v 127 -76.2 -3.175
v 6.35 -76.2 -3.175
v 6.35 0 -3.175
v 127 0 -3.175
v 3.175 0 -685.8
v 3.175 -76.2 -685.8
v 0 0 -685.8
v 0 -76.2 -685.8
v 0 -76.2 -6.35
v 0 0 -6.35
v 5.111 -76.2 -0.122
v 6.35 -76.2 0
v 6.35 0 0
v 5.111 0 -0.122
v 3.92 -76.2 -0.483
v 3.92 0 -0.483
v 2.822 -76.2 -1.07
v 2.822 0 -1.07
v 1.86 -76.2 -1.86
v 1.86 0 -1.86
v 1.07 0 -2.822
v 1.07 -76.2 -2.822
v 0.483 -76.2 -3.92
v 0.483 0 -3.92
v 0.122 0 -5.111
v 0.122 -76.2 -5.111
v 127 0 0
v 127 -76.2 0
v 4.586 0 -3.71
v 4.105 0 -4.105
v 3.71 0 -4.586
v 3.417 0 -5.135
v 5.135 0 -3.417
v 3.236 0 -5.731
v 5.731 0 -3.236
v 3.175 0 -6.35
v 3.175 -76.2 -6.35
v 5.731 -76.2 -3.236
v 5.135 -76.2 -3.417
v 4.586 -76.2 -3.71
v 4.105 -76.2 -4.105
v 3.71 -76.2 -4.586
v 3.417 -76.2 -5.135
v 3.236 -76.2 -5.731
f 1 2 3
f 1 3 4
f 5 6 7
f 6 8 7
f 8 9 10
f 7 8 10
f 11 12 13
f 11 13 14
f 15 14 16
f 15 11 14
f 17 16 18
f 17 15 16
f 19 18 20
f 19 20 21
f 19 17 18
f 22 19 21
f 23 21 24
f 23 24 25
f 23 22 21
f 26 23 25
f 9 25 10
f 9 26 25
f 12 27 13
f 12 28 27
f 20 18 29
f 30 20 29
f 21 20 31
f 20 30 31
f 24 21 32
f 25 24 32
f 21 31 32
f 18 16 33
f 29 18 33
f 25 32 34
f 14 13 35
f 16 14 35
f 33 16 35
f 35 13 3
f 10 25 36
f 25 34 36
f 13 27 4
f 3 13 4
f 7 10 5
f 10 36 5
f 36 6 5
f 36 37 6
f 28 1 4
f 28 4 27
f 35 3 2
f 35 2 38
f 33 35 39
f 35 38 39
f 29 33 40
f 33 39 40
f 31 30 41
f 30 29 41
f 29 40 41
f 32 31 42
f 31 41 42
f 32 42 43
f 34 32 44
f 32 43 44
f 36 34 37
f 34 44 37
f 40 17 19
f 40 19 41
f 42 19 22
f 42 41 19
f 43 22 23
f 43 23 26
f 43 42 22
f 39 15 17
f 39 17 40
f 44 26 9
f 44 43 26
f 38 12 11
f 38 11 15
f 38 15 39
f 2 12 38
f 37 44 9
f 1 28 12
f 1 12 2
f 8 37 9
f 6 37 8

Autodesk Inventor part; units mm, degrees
ref_plane "YZ Plane" through (0, 0, 0) normal (1, 0, 0) x (0, 1, 0)
ref_plane "XZ Plane" through (0, 0, 0) normal (0, 1, 0) x (-1, 0, 0)
ref_plane "XY Plane" through (0, 0, 0) normal (0, 0, 1) x (1, 0, 0)
sketch "Sketch1" plane through (0, 0, 0) normal (1, 0, 0) x (0, 1, 0)
  line L0 (0, 0) -> (-76.2, 0)
  line L1 (-76.2, 0) -> (-76.2, -685.8)
  line L2 (-76.2, -685.8) -> (0, -685.8)
  line L3 (0, -685.8) -> (0, 0)
  dimension "d0" = 76.2
  dimension "d1" = 685.8
extrude "Plate1" add sketch "Sketch1" along normal blind 3.175
sketch "Sketch2" plane through (0, -76.2, -3.175) normal (0, 0, 1) x (1, 0, 0)
  line L0 (0, 76.2) -> (0, 0)
  line L1 (0, 0) -> (127, 0)
  line L2 (127, 0) -> (127, 76.2)
  line L3 (127, 76.2) -> (0, 76.2)
edge flange "Flange1" height 127 angle 90 thickness 3.175 bend radius 3.175 thickness toward (0, 0, 1) relief tear relief width 3.175 relief depth 1.5875 edges at (3.175, -38.1, 0) wall of the first edge with corners at (0, 0, -3.175) (0, -76.2, -3.175) (127, -76.2, -3.175) (127, 0, -3.175)
bend "Bend1"
corner "Corner1"
sketch "Sketch3" plane through (3.175, 0, 0) normal (1, 0, 0) x (0, 0, -1)
  point P0 (0, 0)
equation "\"d3\" = BendReliefWidth"
equation "\"d4\" = BendReliefDepth"
equation "\"d5\" = MinimumRemnant"
equation "\"d6\" = BendRadius"
equation "\"d9\" = BendRadius"
equation "\"d10\" = CornerReliefSize"
equation "\"d11\" = GapSize"
equation "\"d12\" = JacobiRadiusSize"
equation "\"BendRadius\" = Thickness"
equation "\"BendReliefWidth\" = Thickness"
equation "\"BendReliefDepth\" = 0.5 * Thickness"
equation "\"CornerReliefSize\" = 4 * Thickness"
equation "\"MinimumRemnant\" = 2 * Thickness"
equation "\"TransitionRadius\" = BendRadius"
equation "\"JacobiRadiusSize\" = BendRadius"
equation "\"GapSize\" = Thickness"
equation "\"d2\" = BendRadius"
equation "\"Thickness\" = 3.175"
properties part number "ForkLift mockup"
